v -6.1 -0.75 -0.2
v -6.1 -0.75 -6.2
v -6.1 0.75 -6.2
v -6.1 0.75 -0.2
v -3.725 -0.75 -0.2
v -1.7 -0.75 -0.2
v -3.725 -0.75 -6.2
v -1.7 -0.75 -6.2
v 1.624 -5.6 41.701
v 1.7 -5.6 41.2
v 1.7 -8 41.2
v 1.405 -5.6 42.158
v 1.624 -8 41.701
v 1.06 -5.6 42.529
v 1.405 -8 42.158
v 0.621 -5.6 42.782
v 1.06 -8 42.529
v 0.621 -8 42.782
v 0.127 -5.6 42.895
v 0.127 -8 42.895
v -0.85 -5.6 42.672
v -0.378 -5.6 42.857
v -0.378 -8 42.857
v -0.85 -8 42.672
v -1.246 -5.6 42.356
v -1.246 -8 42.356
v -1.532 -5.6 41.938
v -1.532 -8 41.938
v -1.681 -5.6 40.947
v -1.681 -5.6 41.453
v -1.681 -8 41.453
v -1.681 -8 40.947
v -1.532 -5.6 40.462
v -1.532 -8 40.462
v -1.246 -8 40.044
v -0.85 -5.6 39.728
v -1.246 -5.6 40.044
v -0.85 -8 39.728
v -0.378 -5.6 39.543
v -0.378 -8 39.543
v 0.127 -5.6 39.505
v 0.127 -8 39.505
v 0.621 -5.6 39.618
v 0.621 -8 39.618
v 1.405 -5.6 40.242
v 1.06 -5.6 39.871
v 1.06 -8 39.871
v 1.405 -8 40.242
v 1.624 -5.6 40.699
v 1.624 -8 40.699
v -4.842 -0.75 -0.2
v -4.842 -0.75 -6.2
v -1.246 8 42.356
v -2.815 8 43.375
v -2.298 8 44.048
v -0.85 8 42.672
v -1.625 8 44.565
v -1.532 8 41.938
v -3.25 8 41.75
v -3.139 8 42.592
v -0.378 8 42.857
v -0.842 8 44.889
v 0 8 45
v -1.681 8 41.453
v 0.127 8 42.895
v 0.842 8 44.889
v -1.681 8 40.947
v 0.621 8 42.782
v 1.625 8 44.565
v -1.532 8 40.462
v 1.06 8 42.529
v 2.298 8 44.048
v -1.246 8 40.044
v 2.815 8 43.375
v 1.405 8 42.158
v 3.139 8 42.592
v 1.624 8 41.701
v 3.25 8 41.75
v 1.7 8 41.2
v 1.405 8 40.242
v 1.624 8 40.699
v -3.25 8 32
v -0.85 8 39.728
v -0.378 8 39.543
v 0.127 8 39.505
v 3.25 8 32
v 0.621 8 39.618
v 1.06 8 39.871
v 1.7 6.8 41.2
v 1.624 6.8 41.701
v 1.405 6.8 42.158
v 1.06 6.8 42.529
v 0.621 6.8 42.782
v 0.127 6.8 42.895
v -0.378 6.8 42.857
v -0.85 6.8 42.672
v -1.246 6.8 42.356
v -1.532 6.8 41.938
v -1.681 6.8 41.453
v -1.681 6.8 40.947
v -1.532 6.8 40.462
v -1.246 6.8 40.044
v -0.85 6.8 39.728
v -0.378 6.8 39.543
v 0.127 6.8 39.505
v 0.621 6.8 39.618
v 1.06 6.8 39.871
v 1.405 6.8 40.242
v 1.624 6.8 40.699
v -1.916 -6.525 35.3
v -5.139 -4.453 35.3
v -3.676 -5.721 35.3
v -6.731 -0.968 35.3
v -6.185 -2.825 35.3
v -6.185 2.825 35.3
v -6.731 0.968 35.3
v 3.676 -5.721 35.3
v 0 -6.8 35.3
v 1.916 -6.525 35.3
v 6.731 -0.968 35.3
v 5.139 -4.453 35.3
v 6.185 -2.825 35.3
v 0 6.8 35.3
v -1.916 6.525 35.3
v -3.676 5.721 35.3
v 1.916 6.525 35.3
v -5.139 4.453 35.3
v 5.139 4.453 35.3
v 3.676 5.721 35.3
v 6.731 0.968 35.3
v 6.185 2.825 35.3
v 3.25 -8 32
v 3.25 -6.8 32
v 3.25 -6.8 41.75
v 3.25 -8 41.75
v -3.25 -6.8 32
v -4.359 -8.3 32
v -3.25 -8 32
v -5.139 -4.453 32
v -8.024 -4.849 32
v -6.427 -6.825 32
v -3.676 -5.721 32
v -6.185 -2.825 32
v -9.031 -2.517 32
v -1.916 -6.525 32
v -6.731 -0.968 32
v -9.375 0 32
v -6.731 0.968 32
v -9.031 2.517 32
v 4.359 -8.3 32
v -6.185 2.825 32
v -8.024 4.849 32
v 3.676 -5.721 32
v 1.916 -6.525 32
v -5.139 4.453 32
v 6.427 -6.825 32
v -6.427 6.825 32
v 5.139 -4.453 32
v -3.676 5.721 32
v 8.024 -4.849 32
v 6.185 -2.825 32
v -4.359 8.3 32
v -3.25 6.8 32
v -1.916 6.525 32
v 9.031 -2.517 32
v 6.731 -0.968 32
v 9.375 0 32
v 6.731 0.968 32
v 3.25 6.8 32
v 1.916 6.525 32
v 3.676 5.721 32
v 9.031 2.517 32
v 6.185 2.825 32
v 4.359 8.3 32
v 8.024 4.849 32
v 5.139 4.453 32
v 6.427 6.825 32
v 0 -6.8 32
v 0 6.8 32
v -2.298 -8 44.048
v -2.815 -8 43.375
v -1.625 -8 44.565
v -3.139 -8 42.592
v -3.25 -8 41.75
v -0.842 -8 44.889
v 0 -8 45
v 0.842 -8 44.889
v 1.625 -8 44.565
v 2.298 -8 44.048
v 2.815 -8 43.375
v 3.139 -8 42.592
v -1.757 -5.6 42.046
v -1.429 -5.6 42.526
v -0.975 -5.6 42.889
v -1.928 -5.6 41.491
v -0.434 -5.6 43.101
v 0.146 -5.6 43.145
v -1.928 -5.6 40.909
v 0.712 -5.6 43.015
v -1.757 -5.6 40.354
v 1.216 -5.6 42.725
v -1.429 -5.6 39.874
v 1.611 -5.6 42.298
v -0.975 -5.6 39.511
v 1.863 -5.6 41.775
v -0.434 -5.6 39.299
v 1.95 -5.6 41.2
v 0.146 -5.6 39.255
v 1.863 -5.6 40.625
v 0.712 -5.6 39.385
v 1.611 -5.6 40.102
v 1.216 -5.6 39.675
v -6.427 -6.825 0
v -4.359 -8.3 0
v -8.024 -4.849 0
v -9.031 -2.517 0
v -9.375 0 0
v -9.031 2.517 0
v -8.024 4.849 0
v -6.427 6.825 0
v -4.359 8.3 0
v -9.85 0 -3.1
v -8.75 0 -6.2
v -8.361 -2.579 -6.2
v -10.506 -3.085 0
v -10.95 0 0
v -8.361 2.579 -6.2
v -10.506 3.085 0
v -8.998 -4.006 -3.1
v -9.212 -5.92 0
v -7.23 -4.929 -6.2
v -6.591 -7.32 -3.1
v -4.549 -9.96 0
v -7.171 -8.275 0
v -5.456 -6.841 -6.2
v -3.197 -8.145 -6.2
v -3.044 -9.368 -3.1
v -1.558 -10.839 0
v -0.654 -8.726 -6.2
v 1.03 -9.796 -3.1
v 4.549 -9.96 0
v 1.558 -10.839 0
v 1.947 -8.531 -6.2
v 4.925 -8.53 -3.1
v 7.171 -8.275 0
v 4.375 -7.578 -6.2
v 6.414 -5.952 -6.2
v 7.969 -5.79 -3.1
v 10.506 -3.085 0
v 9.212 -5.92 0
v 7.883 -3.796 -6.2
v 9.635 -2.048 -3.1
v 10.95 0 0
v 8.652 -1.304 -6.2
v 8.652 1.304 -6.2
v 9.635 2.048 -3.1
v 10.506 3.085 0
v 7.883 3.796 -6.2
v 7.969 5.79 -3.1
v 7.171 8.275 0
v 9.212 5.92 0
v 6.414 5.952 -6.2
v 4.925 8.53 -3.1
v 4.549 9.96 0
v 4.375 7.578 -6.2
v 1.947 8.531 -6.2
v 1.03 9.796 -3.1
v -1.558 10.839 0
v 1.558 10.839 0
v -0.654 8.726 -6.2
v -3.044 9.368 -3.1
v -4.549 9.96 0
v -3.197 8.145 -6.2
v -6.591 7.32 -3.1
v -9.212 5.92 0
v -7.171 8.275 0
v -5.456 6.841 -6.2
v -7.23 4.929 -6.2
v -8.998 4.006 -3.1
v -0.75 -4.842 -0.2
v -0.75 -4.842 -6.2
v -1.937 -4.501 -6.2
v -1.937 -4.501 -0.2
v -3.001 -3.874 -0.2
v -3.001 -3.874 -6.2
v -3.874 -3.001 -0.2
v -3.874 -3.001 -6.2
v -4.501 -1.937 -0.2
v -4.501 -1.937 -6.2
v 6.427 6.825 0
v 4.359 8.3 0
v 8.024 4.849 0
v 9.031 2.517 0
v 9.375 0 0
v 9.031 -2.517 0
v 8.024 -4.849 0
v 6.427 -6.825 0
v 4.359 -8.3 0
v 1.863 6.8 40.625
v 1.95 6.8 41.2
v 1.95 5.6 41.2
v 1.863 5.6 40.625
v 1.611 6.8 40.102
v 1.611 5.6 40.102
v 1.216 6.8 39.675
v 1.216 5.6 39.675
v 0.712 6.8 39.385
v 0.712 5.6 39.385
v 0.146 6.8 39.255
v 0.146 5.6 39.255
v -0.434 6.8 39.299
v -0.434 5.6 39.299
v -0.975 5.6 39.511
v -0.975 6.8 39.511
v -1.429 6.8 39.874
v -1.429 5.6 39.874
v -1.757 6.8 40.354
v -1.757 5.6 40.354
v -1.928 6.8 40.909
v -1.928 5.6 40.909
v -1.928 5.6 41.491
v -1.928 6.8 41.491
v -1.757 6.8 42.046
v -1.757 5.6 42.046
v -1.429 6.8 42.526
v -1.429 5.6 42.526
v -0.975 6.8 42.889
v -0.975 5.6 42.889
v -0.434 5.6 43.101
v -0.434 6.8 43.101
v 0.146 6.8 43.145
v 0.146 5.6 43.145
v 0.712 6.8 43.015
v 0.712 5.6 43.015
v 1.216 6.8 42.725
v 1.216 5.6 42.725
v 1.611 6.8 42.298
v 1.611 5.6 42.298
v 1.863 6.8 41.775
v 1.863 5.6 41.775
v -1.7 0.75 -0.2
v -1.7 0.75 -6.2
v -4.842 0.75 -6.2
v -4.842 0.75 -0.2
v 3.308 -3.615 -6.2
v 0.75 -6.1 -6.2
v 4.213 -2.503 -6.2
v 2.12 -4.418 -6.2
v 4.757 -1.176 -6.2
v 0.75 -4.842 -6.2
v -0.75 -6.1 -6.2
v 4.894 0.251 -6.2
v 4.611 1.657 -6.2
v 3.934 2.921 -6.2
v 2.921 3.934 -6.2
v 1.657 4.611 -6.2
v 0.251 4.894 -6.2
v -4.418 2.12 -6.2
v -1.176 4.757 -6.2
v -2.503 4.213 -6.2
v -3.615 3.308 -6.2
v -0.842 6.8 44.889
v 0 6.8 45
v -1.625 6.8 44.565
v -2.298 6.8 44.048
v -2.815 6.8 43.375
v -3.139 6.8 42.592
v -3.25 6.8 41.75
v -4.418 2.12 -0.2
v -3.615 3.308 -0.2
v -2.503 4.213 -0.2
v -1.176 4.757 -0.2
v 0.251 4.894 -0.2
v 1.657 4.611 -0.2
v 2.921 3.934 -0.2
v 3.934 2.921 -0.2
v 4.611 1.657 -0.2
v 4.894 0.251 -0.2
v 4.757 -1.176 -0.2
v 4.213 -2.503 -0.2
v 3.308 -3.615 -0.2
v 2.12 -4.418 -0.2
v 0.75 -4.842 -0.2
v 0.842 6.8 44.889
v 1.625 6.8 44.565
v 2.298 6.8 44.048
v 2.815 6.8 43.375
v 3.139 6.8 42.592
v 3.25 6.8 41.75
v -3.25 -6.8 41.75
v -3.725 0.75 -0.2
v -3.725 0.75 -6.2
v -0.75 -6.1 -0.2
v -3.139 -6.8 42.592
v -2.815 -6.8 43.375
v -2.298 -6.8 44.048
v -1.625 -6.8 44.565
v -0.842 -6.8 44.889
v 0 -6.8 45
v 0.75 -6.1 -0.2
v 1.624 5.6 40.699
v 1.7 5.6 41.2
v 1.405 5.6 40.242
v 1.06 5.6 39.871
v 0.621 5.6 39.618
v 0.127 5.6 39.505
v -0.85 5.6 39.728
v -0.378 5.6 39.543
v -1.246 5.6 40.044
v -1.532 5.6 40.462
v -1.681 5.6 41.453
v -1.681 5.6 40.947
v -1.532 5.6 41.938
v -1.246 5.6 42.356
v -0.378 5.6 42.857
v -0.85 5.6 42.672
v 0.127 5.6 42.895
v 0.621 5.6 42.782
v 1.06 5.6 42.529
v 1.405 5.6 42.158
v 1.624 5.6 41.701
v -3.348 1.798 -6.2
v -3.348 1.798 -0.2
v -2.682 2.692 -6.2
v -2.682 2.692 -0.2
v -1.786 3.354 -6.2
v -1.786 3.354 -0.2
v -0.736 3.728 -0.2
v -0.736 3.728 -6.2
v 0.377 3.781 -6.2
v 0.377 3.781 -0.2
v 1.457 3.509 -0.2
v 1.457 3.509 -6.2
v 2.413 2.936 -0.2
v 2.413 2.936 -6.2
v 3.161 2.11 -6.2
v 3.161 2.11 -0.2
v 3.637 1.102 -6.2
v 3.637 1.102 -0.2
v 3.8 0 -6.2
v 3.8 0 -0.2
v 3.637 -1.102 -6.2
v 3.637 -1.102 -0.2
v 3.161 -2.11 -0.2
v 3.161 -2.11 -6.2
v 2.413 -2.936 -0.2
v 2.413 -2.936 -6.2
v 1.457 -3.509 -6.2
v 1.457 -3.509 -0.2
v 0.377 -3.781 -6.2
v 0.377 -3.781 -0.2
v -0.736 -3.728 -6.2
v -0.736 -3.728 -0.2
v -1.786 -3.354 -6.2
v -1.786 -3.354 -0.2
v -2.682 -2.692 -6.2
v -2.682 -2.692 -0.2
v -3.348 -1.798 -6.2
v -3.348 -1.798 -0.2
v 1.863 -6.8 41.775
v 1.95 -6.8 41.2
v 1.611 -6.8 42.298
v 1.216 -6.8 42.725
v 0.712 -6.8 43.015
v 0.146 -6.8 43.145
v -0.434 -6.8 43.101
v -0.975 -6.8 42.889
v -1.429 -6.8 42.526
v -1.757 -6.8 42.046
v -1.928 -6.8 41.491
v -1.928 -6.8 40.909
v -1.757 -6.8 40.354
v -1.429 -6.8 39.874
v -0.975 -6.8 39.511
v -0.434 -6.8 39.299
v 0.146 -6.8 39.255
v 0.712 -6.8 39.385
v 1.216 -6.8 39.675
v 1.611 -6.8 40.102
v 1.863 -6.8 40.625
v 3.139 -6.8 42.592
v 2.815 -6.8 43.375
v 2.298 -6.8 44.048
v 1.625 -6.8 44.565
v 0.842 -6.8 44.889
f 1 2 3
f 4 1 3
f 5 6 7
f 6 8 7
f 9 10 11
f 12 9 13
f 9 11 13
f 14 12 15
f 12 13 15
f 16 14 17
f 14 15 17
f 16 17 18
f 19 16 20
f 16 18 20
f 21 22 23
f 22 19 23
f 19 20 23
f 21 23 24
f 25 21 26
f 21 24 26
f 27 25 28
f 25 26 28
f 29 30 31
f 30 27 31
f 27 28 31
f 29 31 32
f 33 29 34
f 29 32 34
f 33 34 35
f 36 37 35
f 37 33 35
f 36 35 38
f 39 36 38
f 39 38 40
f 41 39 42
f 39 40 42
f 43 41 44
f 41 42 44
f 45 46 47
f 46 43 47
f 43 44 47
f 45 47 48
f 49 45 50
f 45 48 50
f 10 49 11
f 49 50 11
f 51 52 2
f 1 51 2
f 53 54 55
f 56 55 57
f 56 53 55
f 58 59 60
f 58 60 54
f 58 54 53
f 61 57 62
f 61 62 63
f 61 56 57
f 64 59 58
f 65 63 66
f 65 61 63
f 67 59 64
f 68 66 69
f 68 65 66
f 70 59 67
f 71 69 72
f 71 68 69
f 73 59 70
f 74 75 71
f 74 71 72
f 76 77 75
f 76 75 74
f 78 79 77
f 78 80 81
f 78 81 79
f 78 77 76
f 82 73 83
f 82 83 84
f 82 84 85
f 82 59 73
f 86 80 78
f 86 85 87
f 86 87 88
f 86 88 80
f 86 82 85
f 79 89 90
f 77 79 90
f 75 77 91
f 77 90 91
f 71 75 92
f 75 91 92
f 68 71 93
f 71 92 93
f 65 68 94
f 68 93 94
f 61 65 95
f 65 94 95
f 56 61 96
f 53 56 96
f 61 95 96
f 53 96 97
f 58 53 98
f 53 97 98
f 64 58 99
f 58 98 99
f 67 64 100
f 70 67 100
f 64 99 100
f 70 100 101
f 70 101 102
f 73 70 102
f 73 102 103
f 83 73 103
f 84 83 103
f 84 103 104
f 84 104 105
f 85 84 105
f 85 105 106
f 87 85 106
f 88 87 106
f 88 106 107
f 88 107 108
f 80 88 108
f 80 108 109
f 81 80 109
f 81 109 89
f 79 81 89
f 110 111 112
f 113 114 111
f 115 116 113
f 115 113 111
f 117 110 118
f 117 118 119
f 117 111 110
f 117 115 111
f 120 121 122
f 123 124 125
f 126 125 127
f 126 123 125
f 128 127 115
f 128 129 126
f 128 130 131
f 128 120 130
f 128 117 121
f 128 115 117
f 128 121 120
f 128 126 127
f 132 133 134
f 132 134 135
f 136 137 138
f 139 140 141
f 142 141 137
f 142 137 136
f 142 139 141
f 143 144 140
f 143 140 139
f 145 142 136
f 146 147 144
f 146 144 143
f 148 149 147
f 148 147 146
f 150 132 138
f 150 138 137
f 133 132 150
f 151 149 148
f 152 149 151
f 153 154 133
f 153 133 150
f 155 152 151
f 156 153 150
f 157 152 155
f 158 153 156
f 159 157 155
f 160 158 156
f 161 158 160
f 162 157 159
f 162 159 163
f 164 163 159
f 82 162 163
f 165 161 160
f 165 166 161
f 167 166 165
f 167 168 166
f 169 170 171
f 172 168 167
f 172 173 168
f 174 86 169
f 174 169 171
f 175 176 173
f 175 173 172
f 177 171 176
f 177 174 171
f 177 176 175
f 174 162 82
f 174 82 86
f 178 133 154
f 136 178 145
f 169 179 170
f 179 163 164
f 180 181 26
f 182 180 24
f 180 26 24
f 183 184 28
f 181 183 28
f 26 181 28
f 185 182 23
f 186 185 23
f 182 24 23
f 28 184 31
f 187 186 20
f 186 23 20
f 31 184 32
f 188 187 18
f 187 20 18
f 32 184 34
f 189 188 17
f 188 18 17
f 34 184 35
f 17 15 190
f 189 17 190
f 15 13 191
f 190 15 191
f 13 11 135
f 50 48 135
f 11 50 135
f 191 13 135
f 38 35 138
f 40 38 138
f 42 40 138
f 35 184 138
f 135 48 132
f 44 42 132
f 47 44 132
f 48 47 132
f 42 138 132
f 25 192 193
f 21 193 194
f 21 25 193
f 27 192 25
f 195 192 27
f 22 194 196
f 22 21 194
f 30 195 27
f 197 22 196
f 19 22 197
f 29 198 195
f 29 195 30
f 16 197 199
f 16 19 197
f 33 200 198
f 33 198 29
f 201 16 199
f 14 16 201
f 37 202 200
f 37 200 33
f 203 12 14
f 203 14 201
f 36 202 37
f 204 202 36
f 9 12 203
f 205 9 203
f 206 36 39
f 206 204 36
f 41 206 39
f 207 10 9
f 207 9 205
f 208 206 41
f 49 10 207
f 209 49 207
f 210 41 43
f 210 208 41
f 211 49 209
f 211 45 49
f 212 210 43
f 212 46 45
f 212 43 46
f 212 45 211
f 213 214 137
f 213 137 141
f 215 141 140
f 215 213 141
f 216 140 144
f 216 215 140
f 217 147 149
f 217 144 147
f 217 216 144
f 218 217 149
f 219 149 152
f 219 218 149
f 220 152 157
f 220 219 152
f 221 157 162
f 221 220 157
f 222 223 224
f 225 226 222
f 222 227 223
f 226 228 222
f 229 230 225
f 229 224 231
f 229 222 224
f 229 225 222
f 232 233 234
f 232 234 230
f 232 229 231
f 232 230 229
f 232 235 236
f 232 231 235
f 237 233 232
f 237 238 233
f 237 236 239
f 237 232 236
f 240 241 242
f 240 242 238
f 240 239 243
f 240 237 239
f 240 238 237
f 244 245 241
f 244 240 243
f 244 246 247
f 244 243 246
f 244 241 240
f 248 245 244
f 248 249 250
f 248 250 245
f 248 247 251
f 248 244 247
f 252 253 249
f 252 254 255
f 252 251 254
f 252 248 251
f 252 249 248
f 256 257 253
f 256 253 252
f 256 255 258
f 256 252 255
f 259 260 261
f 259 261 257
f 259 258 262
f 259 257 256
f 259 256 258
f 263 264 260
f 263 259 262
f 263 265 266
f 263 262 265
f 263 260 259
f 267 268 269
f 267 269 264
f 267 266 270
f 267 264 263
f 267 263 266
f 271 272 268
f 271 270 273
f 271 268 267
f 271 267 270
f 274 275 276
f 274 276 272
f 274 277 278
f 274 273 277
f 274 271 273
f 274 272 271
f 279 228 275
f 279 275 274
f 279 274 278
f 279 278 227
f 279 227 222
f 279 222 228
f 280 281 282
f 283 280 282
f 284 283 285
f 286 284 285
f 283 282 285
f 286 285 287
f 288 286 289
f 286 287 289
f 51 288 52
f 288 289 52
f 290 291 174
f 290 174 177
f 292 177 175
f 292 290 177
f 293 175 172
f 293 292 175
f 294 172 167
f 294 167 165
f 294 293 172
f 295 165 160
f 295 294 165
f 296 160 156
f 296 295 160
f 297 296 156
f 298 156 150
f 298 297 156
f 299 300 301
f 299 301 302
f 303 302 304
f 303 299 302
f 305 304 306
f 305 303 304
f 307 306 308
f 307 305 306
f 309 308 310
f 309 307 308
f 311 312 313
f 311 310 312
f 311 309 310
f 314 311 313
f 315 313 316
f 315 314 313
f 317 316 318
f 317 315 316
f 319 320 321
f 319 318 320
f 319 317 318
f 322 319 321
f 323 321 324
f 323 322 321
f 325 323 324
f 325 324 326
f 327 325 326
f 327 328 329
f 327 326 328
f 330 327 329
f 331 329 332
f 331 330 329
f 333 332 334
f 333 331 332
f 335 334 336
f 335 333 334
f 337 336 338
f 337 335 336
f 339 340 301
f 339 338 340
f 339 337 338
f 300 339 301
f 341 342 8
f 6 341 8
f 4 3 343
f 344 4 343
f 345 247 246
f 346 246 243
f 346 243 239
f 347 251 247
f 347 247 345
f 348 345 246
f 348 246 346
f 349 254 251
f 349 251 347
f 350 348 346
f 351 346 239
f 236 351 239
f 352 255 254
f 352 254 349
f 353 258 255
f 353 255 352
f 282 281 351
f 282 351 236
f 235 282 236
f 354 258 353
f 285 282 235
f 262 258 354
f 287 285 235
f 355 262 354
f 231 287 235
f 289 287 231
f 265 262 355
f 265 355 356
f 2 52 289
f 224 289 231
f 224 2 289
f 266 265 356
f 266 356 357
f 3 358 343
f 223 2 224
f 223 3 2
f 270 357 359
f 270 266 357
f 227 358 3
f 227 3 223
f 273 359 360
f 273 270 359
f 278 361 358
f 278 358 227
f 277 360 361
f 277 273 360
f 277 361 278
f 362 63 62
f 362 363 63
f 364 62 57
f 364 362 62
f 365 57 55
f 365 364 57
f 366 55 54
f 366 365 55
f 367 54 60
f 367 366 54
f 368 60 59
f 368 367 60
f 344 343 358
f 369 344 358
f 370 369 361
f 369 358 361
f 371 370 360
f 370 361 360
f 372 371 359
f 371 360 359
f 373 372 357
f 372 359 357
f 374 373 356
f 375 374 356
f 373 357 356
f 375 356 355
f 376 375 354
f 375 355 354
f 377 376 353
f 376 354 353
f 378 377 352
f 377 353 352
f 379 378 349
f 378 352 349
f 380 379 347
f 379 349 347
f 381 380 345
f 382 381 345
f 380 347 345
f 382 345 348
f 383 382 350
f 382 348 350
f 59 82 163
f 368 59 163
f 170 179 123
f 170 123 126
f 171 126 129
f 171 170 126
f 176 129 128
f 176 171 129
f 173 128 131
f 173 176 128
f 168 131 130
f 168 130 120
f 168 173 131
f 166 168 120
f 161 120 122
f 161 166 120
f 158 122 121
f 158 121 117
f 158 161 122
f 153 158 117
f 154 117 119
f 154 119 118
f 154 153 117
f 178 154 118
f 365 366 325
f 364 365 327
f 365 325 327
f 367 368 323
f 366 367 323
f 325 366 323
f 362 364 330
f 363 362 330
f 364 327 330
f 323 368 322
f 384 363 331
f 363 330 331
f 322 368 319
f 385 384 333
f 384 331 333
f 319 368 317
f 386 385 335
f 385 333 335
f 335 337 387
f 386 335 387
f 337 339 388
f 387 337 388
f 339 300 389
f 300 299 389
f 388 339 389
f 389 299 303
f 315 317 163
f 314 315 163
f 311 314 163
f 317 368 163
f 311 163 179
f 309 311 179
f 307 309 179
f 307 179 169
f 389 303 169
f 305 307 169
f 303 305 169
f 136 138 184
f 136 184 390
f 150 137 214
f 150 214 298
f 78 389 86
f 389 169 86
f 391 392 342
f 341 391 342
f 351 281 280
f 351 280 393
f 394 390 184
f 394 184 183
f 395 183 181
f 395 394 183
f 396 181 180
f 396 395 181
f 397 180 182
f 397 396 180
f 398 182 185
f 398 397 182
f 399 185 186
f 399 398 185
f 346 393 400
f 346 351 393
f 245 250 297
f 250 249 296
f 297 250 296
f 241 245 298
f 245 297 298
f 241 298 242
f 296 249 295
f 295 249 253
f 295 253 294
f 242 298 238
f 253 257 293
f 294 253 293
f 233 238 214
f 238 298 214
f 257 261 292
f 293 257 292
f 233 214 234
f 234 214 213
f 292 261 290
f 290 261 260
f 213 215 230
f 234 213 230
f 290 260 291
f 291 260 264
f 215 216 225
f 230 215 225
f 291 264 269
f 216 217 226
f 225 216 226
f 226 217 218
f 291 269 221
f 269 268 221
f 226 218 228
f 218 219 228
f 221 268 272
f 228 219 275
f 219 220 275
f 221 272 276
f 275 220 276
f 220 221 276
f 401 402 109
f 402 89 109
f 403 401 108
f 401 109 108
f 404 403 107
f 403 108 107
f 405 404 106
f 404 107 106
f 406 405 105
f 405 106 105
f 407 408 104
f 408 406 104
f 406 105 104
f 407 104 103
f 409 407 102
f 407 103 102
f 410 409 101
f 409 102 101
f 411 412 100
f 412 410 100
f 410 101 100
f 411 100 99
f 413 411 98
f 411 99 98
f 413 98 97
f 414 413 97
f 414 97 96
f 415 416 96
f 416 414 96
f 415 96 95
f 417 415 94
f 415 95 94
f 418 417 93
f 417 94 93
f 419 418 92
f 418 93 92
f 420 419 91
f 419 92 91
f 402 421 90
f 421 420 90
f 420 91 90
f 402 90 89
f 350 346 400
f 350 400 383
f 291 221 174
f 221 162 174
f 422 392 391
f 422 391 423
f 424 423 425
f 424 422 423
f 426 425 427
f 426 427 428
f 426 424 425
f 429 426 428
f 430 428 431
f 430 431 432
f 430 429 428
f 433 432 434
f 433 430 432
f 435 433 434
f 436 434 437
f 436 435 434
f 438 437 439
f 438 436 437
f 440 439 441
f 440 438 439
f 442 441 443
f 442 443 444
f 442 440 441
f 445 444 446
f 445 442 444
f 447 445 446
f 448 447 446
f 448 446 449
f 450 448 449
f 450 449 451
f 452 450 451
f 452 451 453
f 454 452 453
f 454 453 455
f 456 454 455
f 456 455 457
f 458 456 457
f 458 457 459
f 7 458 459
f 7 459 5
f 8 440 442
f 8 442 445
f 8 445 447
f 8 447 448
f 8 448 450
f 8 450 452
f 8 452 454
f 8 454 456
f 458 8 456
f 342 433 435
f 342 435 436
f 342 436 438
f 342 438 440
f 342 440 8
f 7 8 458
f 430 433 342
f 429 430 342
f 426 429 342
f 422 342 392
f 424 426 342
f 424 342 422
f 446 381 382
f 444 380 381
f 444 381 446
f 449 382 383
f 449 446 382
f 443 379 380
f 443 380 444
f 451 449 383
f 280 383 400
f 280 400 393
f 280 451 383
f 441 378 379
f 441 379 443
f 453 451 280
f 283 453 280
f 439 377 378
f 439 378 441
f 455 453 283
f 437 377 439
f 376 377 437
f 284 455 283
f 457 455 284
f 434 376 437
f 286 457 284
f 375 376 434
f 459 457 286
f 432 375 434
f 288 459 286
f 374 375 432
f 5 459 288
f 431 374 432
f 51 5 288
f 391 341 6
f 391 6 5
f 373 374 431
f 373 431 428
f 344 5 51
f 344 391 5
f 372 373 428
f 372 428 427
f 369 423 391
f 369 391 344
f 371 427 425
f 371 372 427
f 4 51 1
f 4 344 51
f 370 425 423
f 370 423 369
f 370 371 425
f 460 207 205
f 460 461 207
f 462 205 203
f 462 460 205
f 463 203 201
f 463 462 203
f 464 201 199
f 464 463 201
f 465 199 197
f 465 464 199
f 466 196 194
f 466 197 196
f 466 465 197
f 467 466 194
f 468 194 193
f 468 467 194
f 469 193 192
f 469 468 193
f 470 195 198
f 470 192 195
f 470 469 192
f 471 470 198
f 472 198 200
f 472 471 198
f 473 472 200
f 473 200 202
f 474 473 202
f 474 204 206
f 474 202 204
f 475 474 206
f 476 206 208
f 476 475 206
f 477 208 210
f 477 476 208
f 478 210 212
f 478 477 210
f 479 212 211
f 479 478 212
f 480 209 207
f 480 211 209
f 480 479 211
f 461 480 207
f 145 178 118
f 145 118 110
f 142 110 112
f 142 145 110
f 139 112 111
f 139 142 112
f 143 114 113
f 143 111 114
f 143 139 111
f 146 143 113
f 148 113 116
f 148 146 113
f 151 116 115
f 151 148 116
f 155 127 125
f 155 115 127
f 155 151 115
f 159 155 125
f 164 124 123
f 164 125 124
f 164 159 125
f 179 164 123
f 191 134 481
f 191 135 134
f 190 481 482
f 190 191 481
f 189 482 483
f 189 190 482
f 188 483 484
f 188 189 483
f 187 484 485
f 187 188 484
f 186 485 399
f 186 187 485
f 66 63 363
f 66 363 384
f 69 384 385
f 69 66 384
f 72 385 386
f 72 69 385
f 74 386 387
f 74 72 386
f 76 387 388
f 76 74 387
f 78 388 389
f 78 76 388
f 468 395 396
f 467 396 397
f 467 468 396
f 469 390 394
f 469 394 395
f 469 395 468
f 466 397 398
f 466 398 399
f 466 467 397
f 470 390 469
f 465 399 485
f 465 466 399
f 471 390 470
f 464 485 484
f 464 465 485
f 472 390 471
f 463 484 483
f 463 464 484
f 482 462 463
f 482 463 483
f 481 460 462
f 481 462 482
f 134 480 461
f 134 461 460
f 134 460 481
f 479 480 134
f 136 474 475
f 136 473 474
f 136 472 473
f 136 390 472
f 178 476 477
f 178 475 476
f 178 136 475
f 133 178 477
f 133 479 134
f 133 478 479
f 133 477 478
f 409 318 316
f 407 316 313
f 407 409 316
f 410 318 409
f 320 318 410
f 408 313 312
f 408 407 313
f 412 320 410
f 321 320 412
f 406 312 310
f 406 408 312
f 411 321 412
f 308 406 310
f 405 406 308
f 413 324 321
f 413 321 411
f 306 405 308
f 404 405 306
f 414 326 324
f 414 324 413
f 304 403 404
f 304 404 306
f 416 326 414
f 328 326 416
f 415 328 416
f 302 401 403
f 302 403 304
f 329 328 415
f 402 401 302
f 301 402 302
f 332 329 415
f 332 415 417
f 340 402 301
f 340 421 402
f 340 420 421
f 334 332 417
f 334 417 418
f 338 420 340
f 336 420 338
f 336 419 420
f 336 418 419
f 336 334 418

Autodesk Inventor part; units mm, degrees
ref_plane "YZ Plane" through (0, 0, 0) normal (1, 0, 0) x (0, 1, 0)
ref_plane "XZ Plane" through (0, 0, 0) normal (0, 1, 0) x (-1, 0, 0)
sketch "Sketch1" plane through (0, 0, 0) normal (0, 0, 1) x (1, 0, 0)
  circle A0 centre (0, 0) radius 9.375
  dimension "d0" = 18.75
extrude "Extrusion1" add sketch "Sketch1" along normal blind 32
sketch "Sketch2" plane through (0, 0, 32) normal (0, 0, 1) x (1, 0, 0)
  circle A0 centre (0, 0) radius 9.375 projected
  circle A1 centre (0, 0) radius 6.8
  dimension "d3" = 13.6
extrude "Extrusion2" add sketch "Sketch2" along normal blind 3.3 contours A1
sketch "Sketch3" plane through (0, 0, 32) normal (0, 0, 1) x (1, 0, 0)
  circle A0 centre (0, 0) radius 6.8 projected
  line L0 (-3.25, 8) -> (3.25, 8)
  line L1 (-3.25, -8) -> (3.25, -8)
  line L2 (-3.25, 8) -> (-3.25, 6.8)
  line L3 (-3.25, 6.8) -> (3.25, 6.8)
  line L4 (3.25, 6.8) -> (3.25, 8)
  line L5 (-3.25, -8) -> (-3.25, -6.8)
  line L6 (-3.25, -6.8) -> (3.25, -6.8)
  line L7 (3.25, -6.8) -> (3.25, -8)
  dimension "d6" = 6.5
  dimension "d7" = 6.5
  dimension "d8" = 3.25
  dimension "d9" = 3.25
  dimension "d10" = 1.2
  dimension "d11" = 1.2
  dimension "d12" = 16
  dimension "d13" = 8
extrude "Extrusion3" add sketch "Sketch3" along normal blind 13 contours L6 L7 L1 L5 | L3 L2 L0 L4
sketch "Sketch4" plane through (-3.25, -8, 32) normal (0, -1, 0) x (1, 0, 0)
  line L0 (6.5, 0) -> (6.5, 13) projected
  line L1 (0, 13) -> (6.5, 13) projected
  circle A0 centre (3.25, 9.2) radius 1.7
  point P0 (3.25, -32)
  dimension "d16" = 3.4
  dimension "d17" = 3.25
  dimension "d18" = 3.8
extrude "Extrusion4" cut sketch "Sketch4" against normal up to surface (16 mm away)
fillet "Fillet1" radius 3.25 4 edges at (-3.25, -7.4, 45) (3.25, -7.4, 45) (-3.25, 7.4, 45) (3.25, 7.4, 45)
sketch "Sketch5" plane through (-3.25, 6.8, 32) normal (0, -1, 0) x (1, 0, 0)
  circle A0 centre (3.25, 9.2) radius 1.7 projected
  circle A1 centre (3.25, 9.2) radius 1.95
  point P0 (3.25, -32)
  dimension "d22" = 3.9
extrude "Extrusion5" add sketch "Sketch5" along normal blind 1.2
sketch "Sketch6" plane through (0, -6.8, 32) normal (0, 1, 0) x (1, 0, 0)
  circle A0 centre (0, -9.2) radius 1.7 projected
  circle A1 centre (0, -9.2) radius 1.95
  point P0 (0, 32)
  dimension "d25" = 3.9
extrude "Extrusion6" add sketch "Sketch6" along normal blind 1.2
sketch "Sketch7" plane through (0, 0, 0) normal (0, 0, -1) x (-1, 0, 0)
  circle A0 centre (0, 0) radius 9.375 projected
  circle A1 centre (0, 0) radius 10.95
  dimension "d28" = 21.9
ref_plane "Work Plane1" through (0, 0, -6.2) normal (0, 0, -1) x (-1, 0, 0)
sketch "Sketch8" plane through (0, 0, -6.2) normal (0, 0, -1) x (-1, 0, 0)
  circle A0 centre (0, 0) radius 9.375 projected
  circle A1 centre (0, 0) radius 8.75
  dimension "d30" = 17.5
loft "Loft1" add profiles "Sketch7", "Sketch8" contours A0 | A1 / A1
sketch "Sketch9" plane through (0, 0, 32) normal (0, 0, 1) x (1, 0, 0)
  circle A0 centre (0, 0) radius 9.375 projected
  line L0 (-4.359, 8.3) -> (4.359, 8.3)
  line L1 (-4.359, -8.3) -> (4.359, -8.3)
  point P0 (8.3, 4.359)
  point P1 (8.3, -4.359)
  point P2 (-8.3, 4.359)
  point P3 (-8.3, -4.359)
  dimension "d51" = 16.6
  dimension "d52" = 8.3
thread "Thread1" size "M20x2.5" class "6g" standard "ANSI Metric M Profile" length 22
thread "Thread2" size "M20x2.5" class "6g" standard "ANSI Metric M Profile" length 22
thread "Thread3" size "M3.5x0.6" class "6H" standard "ANSI Metric M Profile" length 10
thread "Thread4" size "M3.5x0.6" class "6H" standard "ANSI Metric M Profile" length 10
sketch "Sketch10" plane through (0, 0, -6.2) normal (0, 0, -1) x (-1, 0, 0)
  circle A0 centre (0, 0) radius 8.75 projected
  circle A1 centre (0, 0) radius 4.9
  circle A2 centre (0, 0) radius 3.8
  dimension "d47" = 9.8
  dimension "d48" = 7.6
extrude "Extrusion8" cut sketch "Sketch10" against normal blind 6 contours A1
extrude "Extrusion9" cut sketch "Sketch9" against normal up to surface (32 mm away) contours L0 A0 | A0 L1
sketch "Sketch11" plane through (0, 0, -6.2) normal (0, 0, -1) x (-1, 0, 0)
  circle A0 centre (0, 0) radius 3.8 projected
  circle A1 centre (0, 0) radius 8.75 projected
  circle A2 centre (0, 0) radius 4.9 projected
  line L0 (6.1, 0.75) -> (1.7, 0.75)
  line L1 (1.7, 0.75) -> (1.7, -0.75)
  line L2 (1.7, -0.75) -> (6.1, -0.75)
  line L3 (6.1, -0.75) -> (6.1, 0.75)
  circle A3 centre (0, 0) radius 4.9 projected
  line L4 (0.75, -4.8423) -> (0.75, -6.1)
  line L5 (0.75, -6.1) -> (-0.75, -6.1)
  line L6 (-0.75, -6.1) -> (-0.75, -4.8423)
  dimension "d55" = 4.4
  dimension "d56" = 1.5
  dimension "d57" = 1.5
  dimension "d58" = 1.2
  dimension "d59" = 0.75
  dimension "d60" = 1.2
  dimension "d61" = 0.75
extrude "Extrusion10" cut sketch "Sketch11" against normal up to surface (6 mm away) contours A0 L2 L1 L0 | A0 L0 A2 L2 | L0 L3 L2 A2 | A2 L4 L5 L6 picked at (2.4, 0) picked at (4.1442, -0.4181)
properties part number "KeySwitchBody" material "Steel, Alloy"
